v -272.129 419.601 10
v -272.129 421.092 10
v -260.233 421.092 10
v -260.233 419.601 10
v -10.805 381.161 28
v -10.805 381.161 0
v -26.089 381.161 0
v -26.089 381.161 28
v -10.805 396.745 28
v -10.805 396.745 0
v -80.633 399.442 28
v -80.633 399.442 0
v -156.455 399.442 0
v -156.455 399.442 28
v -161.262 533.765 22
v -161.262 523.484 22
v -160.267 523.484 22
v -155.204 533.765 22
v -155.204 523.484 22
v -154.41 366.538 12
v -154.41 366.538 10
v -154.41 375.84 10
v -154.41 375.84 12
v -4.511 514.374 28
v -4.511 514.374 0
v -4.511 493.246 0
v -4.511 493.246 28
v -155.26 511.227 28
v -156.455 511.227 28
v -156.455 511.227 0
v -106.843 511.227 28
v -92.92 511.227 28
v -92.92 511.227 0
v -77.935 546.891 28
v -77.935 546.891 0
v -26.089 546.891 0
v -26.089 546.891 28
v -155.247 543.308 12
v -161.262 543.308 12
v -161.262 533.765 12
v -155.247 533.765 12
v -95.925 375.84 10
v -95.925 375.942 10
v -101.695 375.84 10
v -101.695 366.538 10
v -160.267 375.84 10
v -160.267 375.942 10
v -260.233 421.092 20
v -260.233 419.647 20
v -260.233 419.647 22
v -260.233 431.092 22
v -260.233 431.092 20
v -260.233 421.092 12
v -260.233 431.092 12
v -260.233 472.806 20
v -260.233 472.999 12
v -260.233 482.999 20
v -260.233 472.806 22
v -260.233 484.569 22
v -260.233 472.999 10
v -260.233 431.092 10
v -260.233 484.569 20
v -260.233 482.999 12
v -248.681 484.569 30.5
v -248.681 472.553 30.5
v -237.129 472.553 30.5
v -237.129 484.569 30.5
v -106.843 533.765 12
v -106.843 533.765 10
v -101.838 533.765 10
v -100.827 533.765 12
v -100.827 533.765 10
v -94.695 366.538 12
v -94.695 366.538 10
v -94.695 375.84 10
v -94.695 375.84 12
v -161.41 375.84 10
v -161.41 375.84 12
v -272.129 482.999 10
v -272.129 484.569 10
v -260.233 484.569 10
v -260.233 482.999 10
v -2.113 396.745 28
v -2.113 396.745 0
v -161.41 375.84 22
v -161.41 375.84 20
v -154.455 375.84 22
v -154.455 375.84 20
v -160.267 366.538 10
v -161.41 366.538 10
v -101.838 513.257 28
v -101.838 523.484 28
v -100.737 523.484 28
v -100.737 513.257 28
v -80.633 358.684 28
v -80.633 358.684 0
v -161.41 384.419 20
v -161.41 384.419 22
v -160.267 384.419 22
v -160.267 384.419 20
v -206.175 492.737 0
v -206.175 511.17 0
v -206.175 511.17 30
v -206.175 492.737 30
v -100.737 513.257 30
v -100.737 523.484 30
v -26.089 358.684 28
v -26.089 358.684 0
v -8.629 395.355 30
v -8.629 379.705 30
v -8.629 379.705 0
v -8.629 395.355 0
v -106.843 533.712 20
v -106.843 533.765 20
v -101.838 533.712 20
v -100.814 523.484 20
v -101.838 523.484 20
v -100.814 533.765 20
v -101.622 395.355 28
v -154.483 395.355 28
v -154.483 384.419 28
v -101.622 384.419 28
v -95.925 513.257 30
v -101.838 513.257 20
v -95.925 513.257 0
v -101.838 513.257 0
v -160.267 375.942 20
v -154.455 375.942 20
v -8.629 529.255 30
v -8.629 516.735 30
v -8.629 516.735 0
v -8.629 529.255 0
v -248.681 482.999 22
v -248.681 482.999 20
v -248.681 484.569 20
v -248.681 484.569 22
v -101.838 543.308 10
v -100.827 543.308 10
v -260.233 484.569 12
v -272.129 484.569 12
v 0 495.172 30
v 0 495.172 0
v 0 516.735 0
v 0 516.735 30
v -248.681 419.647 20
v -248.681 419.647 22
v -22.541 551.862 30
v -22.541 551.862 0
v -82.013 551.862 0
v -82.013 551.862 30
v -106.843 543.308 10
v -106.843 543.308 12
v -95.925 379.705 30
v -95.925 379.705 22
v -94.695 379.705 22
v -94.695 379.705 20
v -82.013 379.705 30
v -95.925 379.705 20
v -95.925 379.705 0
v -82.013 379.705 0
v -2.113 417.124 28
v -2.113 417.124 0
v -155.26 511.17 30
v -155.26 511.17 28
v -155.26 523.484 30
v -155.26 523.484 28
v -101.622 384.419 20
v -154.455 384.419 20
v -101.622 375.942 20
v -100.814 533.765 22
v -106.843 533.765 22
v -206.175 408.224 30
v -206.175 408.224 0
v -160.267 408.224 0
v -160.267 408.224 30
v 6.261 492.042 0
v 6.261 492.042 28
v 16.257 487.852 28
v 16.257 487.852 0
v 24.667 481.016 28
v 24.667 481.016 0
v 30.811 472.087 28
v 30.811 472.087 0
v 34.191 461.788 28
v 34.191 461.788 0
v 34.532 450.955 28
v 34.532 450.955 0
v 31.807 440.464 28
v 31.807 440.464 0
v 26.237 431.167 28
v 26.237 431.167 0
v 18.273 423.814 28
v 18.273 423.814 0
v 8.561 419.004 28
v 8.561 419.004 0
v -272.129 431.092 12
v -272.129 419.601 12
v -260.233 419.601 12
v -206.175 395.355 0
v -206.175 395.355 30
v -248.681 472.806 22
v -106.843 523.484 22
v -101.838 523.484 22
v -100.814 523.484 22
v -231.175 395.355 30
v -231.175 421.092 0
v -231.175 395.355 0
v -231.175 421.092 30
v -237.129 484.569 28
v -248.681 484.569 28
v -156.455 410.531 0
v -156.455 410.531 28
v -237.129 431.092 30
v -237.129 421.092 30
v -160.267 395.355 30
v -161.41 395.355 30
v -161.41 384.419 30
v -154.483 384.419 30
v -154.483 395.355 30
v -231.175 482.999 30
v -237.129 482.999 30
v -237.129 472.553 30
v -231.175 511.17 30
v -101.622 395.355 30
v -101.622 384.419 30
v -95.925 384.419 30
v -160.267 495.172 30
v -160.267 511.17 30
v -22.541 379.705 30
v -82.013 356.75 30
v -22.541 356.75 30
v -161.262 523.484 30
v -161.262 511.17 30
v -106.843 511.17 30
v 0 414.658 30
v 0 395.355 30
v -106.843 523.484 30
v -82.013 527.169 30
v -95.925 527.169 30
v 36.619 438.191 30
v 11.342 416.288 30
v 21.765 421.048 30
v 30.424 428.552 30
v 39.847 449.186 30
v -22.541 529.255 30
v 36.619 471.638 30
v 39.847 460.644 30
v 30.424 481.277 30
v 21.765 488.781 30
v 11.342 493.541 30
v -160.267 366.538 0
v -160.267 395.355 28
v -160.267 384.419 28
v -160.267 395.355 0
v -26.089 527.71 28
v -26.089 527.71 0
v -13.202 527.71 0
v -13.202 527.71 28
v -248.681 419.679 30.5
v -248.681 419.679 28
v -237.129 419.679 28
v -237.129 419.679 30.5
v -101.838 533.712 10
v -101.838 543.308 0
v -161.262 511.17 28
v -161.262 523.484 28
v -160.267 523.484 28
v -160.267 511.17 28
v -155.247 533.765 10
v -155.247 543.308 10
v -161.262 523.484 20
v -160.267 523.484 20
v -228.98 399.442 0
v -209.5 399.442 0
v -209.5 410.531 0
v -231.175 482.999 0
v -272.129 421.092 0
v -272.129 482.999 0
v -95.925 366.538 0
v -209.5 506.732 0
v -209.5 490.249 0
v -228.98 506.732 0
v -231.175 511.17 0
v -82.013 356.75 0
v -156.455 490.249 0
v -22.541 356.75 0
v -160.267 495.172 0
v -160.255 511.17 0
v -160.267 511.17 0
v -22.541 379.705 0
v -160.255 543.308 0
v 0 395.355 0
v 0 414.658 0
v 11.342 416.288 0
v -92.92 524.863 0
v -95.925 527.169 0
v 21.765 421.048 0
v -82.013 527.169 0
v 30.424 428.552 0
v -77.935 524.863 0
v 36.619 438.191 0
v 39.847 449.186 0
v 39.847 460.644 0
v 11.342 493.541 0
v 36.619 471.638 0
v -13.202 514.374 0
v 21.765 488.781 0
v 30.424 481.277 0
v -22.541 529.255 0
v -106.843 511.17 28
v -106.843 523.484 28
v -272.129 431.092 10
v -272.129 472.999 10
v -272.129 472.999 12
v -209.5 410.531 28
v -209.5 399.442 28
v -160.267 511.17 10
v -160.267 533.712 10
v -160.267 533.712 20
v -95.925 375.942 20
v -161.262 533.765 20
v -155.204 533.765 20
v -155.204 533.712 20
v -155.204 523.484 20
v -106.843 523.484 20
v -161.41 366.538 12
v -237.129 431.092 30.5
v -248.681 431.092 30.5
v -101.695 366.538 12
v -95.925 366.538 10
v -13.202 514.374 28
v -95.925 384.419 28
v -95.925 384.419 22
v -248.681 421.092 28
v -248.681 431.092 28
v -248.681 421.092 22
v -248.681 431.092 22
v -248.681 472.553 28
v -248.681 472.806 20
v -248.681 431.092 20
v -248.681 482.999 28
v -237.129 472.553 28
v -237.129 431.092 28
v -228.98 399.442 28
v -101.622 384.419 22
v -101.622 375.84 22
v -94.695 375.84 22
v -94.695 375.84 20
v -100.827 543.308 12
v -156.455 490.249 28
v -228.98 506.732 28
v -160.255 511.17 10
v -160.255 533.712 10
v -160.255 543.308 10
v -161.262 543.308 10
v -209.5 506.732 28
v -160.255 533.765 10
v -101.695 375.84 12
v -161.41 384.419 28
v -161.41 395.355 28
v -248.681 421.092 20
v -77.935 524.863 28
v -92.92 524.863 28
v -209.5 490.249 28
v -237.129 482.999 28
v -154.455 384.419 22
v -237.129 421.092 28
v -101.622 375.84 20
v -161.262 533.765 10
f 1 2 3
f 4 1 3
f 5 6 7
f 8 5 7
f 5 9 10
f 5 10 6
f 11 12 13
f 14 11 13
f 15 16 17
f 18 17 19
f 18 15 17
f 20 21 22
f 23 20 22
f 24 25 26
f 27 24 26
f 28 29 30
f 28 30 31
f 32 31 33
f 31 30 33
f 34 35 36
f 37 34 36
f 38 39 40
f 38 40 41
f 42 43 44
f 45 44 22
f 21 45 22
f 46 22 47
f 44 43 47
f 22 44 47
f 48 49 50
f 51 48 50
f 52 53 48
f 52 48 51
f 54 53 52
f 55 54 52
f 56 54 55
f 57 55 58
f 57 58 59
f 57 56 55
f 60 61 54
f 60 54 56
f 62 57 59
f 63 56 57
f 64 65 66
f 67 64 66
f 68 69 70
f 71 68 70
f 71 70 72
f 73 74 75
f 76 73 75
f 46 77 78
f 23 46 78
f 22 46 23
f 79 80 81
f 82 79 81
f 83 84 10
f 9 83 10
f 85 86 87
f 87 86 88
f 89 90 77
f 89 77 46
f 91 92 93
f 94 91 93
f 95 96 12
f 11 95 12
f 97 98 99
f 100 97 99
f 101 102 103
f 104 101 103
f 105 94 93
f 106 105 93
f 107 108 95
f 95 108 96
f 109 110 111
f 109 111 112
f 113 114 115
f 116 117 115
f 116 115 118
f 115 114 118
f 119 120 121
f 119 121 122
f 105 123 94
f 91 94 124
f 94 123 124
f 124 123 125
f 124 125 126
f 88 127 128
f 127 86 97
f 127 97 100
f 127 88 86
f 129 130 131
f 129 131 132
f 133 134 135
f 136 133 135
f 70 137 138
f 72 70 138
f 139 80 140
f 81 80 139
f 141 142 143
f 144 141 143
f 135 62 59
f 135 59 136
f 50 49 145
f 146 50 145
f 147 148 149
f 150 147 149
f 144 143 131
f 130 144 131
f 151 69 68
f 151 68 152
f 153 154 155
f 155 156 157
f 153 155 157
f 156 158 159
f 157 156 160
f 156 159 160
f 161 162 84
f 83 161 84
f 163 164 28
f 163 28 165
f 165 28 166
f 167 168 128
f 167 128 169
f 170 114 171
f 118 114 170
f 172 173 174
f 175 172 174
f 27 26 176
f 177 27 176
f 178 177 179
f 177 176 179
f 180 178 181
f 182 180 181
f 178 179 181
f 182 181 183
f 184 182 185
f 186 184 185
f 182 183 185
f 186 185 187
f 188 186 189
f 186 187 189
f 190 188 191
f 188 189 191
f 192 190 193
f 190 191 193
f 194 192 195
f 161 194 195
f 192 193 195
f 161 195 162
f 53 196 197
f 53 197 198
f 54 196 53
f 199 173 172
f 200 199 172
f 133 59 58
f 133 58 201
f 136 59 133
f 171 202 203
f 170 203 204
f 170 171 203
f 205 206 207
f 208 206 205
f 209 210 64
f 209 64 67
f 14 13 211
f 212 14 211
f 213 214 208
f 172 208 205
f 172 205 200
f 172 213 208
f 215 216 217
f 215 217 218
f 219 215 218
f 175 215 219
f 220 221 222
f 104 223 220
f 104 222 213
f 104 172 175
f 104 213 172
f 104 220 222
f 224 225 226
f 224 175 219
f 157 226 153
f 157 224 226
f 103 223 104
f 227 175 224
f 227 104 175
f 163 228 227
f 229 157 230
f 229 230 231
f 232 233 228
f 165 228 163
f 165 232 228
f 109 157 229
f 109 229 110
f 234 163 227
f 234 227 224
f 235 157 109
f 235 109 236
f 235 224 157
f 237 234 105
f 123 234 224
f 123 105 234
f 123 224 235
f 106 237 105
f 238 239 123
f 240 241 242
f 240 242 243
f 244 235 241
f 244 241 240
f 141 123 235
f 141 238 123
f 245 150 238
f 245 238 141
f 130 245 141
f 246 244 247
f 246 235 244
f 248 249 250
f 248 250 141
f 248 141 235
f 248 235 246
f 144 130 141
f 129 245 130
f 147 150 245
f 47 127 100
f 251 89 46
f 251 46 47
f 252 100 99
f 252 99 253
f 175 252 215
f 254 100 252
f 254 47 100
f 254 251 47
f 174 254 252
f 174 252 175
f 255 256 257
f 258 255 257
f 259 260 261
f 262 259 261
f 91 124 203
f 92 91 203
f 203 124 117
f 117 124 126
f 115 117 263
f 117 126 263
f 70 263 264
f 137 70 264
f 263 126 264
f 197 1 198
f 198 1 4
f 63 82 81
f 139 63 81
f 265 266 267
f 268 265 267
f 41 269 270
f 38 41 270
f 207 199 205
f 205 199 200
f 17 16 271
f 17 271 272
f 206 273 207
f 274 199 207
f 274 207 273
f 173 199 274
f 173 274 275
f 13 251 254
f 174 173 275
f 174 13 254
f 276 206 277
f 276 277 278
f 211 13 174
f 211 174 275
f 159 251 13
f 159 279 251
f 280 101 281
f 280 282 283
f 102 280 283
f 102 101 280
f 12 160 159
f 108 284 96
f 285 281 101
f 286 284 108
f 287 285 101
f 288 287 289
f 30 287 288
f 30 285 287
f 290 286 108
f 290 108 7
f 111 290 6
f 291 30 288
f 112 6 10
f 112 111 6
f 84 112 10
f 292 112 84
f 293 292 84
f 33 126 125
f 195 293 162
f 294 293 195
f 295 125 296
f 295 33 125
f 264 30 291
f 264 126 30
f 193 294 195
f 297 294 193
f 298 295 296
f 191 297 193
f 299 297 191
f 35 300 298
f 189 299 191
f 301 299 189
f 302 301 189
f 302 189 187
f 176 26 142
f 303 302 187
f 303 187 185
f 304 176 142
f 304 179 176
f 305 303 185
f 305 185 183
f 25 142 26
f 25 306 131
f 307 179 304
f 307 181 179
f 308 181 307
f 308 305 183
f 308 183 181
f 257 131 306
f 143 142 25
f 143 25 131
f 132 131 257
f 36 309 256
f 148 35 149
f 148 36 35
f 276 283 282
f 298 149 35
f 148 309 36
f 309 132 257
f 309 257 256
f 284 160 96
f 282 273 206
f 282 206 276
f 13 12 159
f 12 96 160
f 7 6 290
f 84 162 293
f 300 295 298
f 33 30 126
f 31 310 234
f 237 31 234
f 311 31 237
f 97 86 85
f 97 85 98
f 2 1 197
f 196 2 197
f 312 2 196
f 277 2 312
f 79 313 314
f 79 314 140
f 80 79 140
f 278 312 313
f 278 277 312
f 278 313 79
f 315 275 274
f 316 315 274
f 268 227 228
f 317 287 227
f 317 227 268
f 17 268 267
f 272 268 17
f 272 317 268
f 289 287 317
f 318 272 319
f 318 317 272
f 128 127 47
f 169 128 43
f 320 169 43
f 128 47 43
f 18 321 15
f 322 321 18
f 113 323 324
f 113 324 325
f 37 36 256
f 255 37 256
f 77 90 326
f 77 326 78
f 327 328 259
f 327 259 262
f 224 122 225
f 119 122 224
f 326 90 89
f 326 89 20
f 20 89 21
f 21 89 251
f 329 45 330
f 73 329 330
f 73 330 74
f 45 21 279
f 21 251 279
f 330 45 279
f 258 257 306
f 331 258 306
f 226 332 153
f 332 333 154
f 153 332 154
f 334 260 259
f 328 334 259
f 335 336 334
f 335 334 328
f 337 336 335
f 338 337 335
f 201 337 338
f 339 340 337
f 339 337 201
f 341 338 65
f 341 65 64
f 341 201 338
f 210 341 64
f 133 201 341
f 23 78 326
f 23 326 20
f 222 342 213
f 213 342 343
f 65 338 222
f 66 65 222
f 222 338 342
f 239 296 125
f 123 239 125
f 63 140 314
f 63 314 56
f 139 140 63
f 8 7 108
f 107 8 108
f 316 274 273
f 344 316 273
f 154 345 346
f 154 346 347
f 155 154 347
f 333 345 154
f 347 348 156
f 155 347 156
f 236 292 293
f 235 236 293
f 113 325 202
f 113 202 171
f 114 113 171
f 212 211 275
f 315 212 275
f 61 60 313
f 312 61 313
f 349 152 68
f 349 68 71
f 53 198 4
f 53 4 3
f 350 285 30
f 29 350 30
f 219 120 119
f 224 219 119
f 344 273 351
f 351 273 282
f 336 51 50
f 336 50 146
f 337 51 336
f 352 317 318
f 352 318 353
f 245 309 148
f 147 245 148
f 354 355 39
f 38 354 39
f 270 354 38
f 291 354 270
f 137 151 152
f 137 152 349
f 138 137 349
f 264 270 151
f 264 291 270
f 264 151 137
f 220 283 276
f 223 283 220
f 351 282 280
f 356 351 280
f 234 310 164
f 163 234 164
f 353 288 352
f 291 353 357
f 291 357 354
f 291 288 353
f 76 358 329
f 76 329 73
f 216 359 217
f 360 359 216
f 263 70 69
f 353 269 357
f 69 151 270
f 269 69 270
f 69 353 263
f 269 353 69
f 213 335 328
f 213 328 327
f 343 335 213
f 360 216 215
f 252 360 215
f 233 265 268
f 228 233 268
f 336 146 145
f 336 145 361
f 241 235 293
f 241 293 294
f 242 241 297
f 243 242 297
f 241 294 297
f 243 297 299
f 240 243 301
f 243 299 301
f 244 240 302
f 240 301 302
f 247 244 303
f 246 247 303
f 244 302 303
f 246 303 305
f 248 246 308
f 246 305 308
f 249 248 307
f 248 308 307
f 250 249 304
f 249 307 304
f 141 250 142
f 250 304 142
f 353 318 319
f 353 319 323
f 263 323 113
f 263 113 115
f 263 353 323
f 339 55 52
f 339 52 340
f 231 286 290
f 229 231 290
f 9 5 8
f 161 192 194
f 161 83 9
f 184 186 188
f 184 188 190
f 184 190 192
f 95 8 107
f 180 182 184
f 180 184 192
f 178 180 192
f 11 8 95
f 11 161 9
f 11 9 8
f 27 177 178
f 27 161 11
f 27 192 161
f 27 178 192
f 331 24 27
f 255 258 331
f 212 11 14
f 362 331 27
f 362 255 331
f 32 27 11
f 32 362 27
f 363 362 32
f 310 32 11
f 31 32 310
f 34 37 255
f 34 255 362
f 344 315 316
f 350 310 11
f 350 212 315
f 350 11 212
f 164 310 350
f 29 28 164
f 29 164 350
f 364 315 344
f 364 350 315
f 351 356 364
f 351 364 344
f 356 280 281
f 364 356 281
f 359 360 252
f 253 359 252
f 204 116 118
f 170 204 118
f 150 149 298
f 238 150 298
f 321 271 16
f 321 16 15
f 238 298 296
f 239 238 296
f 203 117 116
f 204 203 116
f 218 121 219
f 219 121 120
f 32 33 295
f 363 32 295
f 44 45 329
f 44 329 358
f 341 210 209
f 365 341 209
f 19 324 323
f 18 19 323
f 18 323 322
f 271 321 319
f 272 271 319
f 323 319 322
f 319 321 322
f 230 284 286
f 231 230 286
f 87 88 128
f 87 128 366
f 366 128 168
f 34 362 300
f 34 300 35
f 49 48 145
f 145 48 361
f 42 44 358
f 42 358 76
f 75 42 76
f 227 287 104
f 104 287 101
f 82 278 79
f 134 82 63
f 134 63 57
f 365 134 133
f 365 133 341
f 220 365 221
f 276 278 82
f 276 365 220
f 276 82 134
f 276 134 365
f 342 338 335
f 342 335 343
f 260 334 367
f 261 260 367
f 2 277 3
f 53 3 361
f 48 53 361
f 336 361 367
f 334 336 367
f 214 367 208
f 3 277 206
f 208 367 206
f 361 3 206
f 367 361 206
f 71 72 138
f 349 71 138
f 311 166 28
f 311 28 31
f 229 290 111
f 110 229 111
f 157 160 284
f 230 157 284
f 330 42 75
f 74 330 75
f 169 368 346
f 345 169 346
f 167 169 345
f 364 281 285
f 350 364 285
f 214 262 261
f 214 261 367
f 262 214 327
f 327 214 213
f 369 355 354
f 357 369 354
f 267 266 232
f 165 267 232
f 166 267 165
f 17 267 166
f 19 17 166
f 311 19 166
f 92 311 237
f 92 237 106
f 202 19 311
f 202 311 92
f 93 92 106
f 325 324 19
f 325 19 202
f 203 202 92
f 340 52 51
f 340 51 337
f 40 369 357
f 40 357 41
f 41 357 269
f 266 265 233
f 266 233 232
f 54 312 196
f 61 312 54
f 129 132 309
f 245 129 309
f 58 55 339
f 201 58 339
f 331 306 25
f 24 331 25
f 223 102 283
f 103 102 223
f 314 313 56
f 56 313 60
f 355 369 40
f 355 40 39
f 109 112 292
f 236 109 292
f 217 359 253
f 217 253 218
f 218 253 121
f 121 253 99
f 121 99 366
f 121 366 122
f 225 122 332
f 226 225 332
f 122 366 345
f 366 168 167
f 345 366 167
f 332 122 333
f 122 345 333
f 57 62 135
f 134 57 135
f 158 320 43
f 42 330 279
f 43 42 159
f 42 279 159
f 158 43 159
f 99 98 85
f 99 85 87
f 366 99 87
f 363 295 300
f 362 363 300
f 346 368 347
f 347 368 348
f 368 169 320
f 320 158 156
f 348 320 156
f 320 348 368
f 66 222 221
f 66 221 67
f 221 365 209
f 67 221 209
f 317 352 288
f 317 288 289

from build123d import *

# Parameters (mm, degrees)
BOSS_EXTRUDE1_DEPTH  = 30
SKETCH4_W            = 35
SKETCH4_H            = 61.907073604
BOSS_EXTRUDE2_DEPTH  = 10
SKETCH5_W            = 23.104058428
SKETCH5_H            = 61.907073604
BOSS_EXTRUDE3_DEPTH  = 10
SKETCH6_W            = 11.552029214
SKETCH6_H            = 61.907073604
BOSS_EXTRUDE5_DEPTH  = 8
SKETCH8_W            = 11.895941572
SKETCH8_H            = 11.490805908
SKETCH8_H_2          = 11.569660377
BOSS_EXTRUDE6_DEPTH  = 2
SKETCH9_W            = 11.552029214
SKETCH9_H            = 11.763067294
SKETCH9_H_2          = 11.444663326
BOSS_EXTRUDE7_DEPTH  = 2
SKETCH10_W           = 11.552029214
SKETCH10_H           = 12.016051613
SKETCH10_H_2         = 11.413040286
BOSS_EXTRUDE8_DEPTH  = 2.5
SKETCH11_W           = 64.341621443
SKETCH11_H           = 28.817099519
BOSS_EXTRUDE9_DEPTH  = 10
SKETCH12_W           = 64.341621443
SKETCH12_H           = 19.413143898
BOSS_EXTRUDE10_DEPTH = 10
SKETCH13_W           = 64.341621443
SKETCH13_H           = 10.936081157
BOSS_EXTRUDE11_DEPTH = 8
SKETCH14_W           = 7
SKETCH14_H           = 9.302294552
BOSS_EXTRUDE12_DEPTH = 2
SKETCH15_W           = 6.954726323
SKETCH15_H           = 8.57872381
SKETCH15_W_2         = 6.927384131
BOSS_EXTRUDE13_DEPTH = 2
SKETCH16_W           = 6.926390046
SKETCH16_H           = 10.936081157
SKETCH16_W_2         = 6.728901939
BOSS_EXTRUDE14_DEPTH = 2
SKETCH17_W           = 58.417259869
SKETCH17_H           = 32.138328606
BOSS_EXTRUDE15_DEPTH = 10
SKETCH18_W           = 58.429148121
SKETCH18_H           = 22.541723998
BOSS_EXTRUDE16_DEPTH = 10
SKETCH19_W           = 58.429148121
SKETCH19_H           = 12.314239644
BOSS_EXTRUDE17_DEPTH = 8
SKETCH20_W           = 30
SKETCH20_H           = 115.814918598
BOSS_EXTRUDE18_DEPTH = 25
SKETCH21_W           = 6.015404917
SKETCH21_H           = 9.543718354
SKETCH21_W_2         = 6.015404916
BOSS_EXTRUDE19_DEPTH = 2
SKETCH22_W           = 6.058740194
SKETCH22_H           = 10.280370608
SKETCH22_W_2         = 6.028288377
BOSS_EXTRUDE20_DEPTH = 2
SKETCH23_W           = 6.002521456
SKETCH23_H           = 12.314239644
SKETCH23_W_2         = 6.105589141
BOSS_EXTRUDE21_DEPTH = 2
CUT_EXTRUDE2_DEPTH   = 28


with BuildPart() as part:
    # Sketch1 → Boss-Extrude1 (new body)
    with BuildSketch(Plane.XY):
        with BuildLine():
            Line((-237.128848942, 435.351344416), (-237.128848942, 421.091849934))
            Line((-237.128848942, 421.091849934), (-206.17531214, 421.091849934))
            Line((-206.17531214, 421.091849934), (-206.17531214, 408.223525645))
            Line((-206.17531214, 408.223525645), (-160.266695759, 408.223525645))
            Line((-160.266695759, 408.223525645), (-160.266695759, 395.355201356))
            Line((-160.266695759, 395.355201356), (-131.052121698, 395.355201356))
            Line((-131.052121698, 395.355201356), (-101.837547638, 395.355201356))
            Line((-101.837547638, 395.355201356), (-95.925074316, 395.355201356))
            Line((-95.925074316, 395.355201356), (-95.925074316, 379.704536681))
            Line((-95.925074316, 379.704536681), (-82.013372382, 379.704536681))
            Line((-82.013372382, 379.704536681), (-82.013372382, 356.75022849))
            Line((-82.013372382, 356.75022849), (-22.540846616, 356.75022849))
            Line((-22.540846616, 356.75022849), (-22.540846616, 379.704536681))
            Line((-22.540846616, 379.704536681), (-8.629144682, 379.704536681))
            Line((-8.629144682, 379.704536681), (-8.629144682, 395.355201356))
            Line((-8.629144682, 395.355201356), (0, 395.355201356))
            Line((0, 395.355201356), (0, 414.657687789))
            ThreePointArc((0, 414.657687789), (40.25698747, 454.91467526), (0, 495.17166273))
            Line((0, 495.17166273), (0, 516.734800727))
            Line((0, 516.734800727), (-8.629144682, 516.734800727))
            Line((-8.629144682, 516.734800727), (-8.629144682, 529.255332468))
            Line((-8.629144682, 529.255332468), (-22.540846616, 529.255332468))
            Line((-22.540846616, 529.255332468), (-22.540846616, 551.86184811))
            Line((-22.540846616, 551.86184811), (-82.013372382, 551.86184811))
            Line((-82.013372382, 551.86184811), (-82.013372382, 527.168577178))
            Line((-82.013372382, 527.168577178), (-95.925074316, 527.168577178))
            Line((-95.925074316, 527.168577178), (-95.925074316, 513.256875244))
            Line((-95.925074316, 513.256875244), (-101.837547638, 513.256875244))
            Line((-101.837547638, 513.256875244), (-101.837547638, 511.170119954))
            Line((-101.837547638, 511.170119954), (-131.052121698, 511.170119954))
            Line((-131.052121698, 511.170119954), (-160.266695759, 511.170119954))
            Line((-160.266695759, 511.170119954), (-160.266695759, 495.17166273))
            Line((-160.266695759, 495.17166273), (-206.17531214, 492.737114892))
            Line((-206.17531214, 492.737114892), (-206.17531214, 482.998923538))
            Line((-206.17531214, 482.998923538), (-237.128848942, 482.998923538))
            Line((-237.128848942, 482.998923538), (-237.128848942, 464.565918476))
            Line((-237.128848942, 464.565918476), (-237.128848942, 454.132142026))
            Line((-237.128848942, 454.132142026), (-237.128848942, 435.351344416))
        make_face()
    extrude(amount=BOSS_EXTRUDE1_DEPTH)

    # Sketch4 → Boss-Extrude2 (add)
    with BuildSketch(Plane(origin=(0, 0, 0), x_dir=(-1, 0, 0), z_dir=(0, 0, -1))):
        with Locations((254.628848942, 452.045386736)):
            Rectangle(SKETCH4_W, SKETCH4_H)
    extrude(amount=-BOSS_EXTRUDE2_DEPTH)

    # Sketch5 → Boss-Extrude3 (add)
    with BuildSketch(Plane.XY.offset(10)):
        with Locations((-248.680878156, 452.045386736)):
            Rectangle(SKETCH5_W, SKETCH5_H)
    extrude(amount=BOSS_EXTRUDE3_DEPTH)

    # Sketch6 → Boss-Extrude5 (add)
    with BuildSketch(Plane.XY.offset(20)):
        with Locations((-242.904863549, 452.045386736)):
            Rectangle(SKETCH6_W, SKETCH6_H)
    extrude(amount=BOSS_EXTRUDE5_DEPTH)

    # Sketch8 → Boss-Extrude6 (add)
    with BuildSketch(Plane.XY.offset(10)):
        with Locations((-266.180878156, 425.34644698)):
            Rectangle(SKETCH8_W, SKETCH8_H)
        with Locations((-266.180878156, 478.783753727)):
            Rectangle(SKETCH8_W, SKETCH8_H_2)
    extrude(amount=BOSS_EXTRUDE6_DEPTH)

    # Sketch9 → Boss-Extrude7 (add)
    with BuildSketch(Plane.XY.offset(20)):
        with Locations((-254.456892763, 478.687050268)):
            Rectangle(SKETCH9_W, SKETCH9_H)
        with Locations((-254.456892763, 425.369518271)):
            Rectangle(SKETCH9_W, SKETCH9_H_2)
    extrude(amount=BOSS_EXTRUDE7_DEPTH)

    # Sketch10 → Boss-Extrude8 (add)
    with BuildSketch(Plane.XY.offset(28)):
        with Locations((-242.904863549, 478.560558109)):
            Rectangle(SKETCH10_W, SKETCH10_H)
        with Locations((-242.904863549, 425.385329791)):
            Rectangle(SKETCH10_W, SKETCH10_H_2)
    extrude(amount=BOSS_EXTRUDE8_DEPTH)

    # Sketch11 → Boss-Extrude9 (add)
    with BuildSketch(Plane(origin=(0, 0, 0), x_dir=(-1, 0, 0), z_dir=(0, 0, -1))):
        with Locations((128.095885038, 380.946651597)):
            Rectangle(SKETCH11_W, SKETCH11_H)
    extrude(amount=-BOSS_EXTRUDE9_DEPTH)

    # Sketch12 → Boss-Extrude10 (add)
    with BuildSketch(Plane.XY.offset(10)):
        with Locations((-128.095885038, 385.648629407)):
            Rectangle(SKETCH12_W, SKETCH12_H)
    extrude(amount=BOSS_EXTRUDE10_DEPTH)

    # Sketch13 → Boss-Extrude11 (add)
    with BuildSketch(Plane.XY.offset(20)):
        with Locations((-128.095885038, 389.887160778)):
            Rectangle(SKETCH13_W, SKETCH13_H)
    extrude(amount=BOSS_EXTRUDE11_DEPTH)

    # Sketch14 → Boss-Extrude12 (add)
    with BuildSketch(Plane.XY.offset(10)):
        with Locations((-157.909862062, 371.189249113)):
            Rectangle(SKETCH14_W, SKETCH14_H)
        with Locations((-98.195021783, 371.189249113)):
            Rectangle(SKETCH14_W, SKETCH14_H)
    extrude(amount=BOSS_EXTRUDE12_DEPTH)

    # Sketch15 → Boss-Extrude13 (add)
    with BuildSketch(Plane.XY.offset(20)):
        with Locations((-157.932498901, 380.129758294)):
            Rectangle(SKETCH15_W, SKETCH15_H)
        with Locations((-98.158713849, 380.129758294)):
            Rectangle(SKETCH15_W_2, SKETCH15_H)
    extrude(amount=BOSS_EXTRUDE13_DEPTH)

    # Sketch16 → Boss-Extrude14 (add)
    with BuildSketch(Plane.XY.offset(28)):
        with Locations((-157.946667039, 389.887160778)):
            Rectangle(SKETCH16_W, SKETCH16_H)
        with Locations((-98.257954944, 389.887160778)):
            Rectangle(SKETCH16_W_2, SKETCH16_H)
    extrude(amount=BOSS_EXTRUDE14_DEPTH)

    # Sketch17 → Boss-Extrude15 (add)
    with BuildSketch(Plane(origin=(0, 0, 0), x_dir=(-1, 0, 0), z_dir=(0, 0, -1))):
        with Locations((131.046177572, 527.239284257)):
            Rectangle(SKETCH17_W, SKETCH17_H)
    extrude(amount=-BOSS_EXTRUDE15_DEPTH)

    # Sketch18 → Boss-Extrude16 (add)
    with BuildSketch(Plane.XY.offset(10)):
        with Locations((-131.052121699, 522.440981953)):
            Rectangle(SKETCH18_W, SKETCH18_H)
    extrude(amount=BOSS_EXTRUDE16_DEPTH)

    # Sketch19 → Boss-Extrude17 (add)
    with BuildSketch(Plane.XY.offset(20)):
        with Locations((-131.052121699, 517.327239776)):
            Rectangle(SKETCH19_W, SKETCH19_H)
    extrude(amount=BOSS_EXTRUDE17_DEPTH)

    # Sketch20 → Boss-Extrude18 (add)
    with BuildSketch(Plane.ZY.offset(206.17531214)):
        with Locations((15, 453.262660655)):
            Rectangle(SKETCH20_W, SKETCH20_H)
    extrude(amount=BOSS_EXTRUDE18_DEPTH)

    # Sketch21 → Boss-Extrude19 (add)
    with BuildSketch(Plane.XY.offset(10)):
        with Locations((-158.254585418, 538.536589383)):
            Rectangle(SKETCH21_W, SKETCH21_H)
        with Locations((-103.834847481, 538.536589383)):
            Rectangle(SKETCH21_W_2, SKETCH21_H)
    extrude(amount=BOSS_EXTRUDE19_DEPTH)

    # Sketch22 → Boss-Extrude20 (add)
    with BuildSketch(Plane.XY.offset(20)):
        with Locations((-158.232917779, 528.624544902)):
            Rectangle(SKETCH22_W, SKETCH22_H)
        with Locations((-103.828405751, 528.624544902)):
            Rectangle(SKETCH22_W_2, SKETCH22_H)
    extrude(amount=BOSS_EXTRUDE20_DEPTH)

    # Sketch23 → Boss-Extrude21 (add)
    with BuildSketch(Plane.XY.offset(28)):
        with Locations((-158.261027148, 517.327239776)):
            Rectangle(SKETCH23_W, SKETCH23_H)
        with Locations((-103.789755369, 517.327239776)):
            Rectangle(SKETCH23_W_2, SKETCH23_H)
    extrude(amount=BOSS_EXTRUDE21_DEPTH)

    # Sketch24 → Cut-Extrude2 (cut)
    with BuildSketch(Plane(origin=(0, 0, 0), x_dir=(-1, 0, 0), z_dir=(0, 0, -1))):
        with BuildLine():
            Line((228.979940095, 479.759783132), (228.979940095, 506.732020696))
            Line((228.979940095, 506.732020696), (209.499990744, 506.732020696))
            Line((209.499990744, 506.732020696), (209.499990744, 490.248986629))
            Line((209.499990744, 490.248986629), (156.454590203, 490.248986629))
            Line((156.454590203, 490.248986629), (156.454590203, 511.227393623))
            Line((156.454590203, 511.227393623), (107.005488005, 511.227393623))
            Line((107.005488005, 511.227393623), (92.919986166, 511.227393623))
            Line((92.919986166, 511.227393623), (92.919986166, 524.863358168))
            Line((92.919986166, 524.863358168), (77.935409742, 524.863358168))
            Line((77.935409742, 524.863358168), (77.935409742, 546.890685512))
            Line((77.935409742, 546.890685512), (26.088775316, 546.890685512))
            Line((26.088775316, 546.890685512), (26.088775316, 527.710427689))
            Line((26.088775316, 527.710427689), (13.202039591, 527.710427689))
            Line((13.202039591, 527.710427689), (13.202039591, 514.374154672))
            Line((13.202039591, 514.374154672), (4.510985265, 514.374154672))
            Line((4.510985265, 514.374154672), (4.510985265, 493.245901914))
            ThreePointArc((4.510985265, 493.245901914), (-34.748604966, 456.383843911), (2.113453037, 417.124253681))
            Line((2.113453037, 417.124253681), (2.113453037, 396.745229744))
            Line((2.113453037, 396.745229744), (10.804507363, 396.745229744))
            Line((10.804507363, 396.745229744), (10.804507363, 381.161270263))
            Line((10.804507363, 381.161270263), (26.088775316, 381.161270263))
            Line((26.088775316, 381.161270263), (26.088775316, 358.684405627))
            Line((26.088775316, 358.684405627), (80.632633499, 358.684405627))
            Line((80.632633499, 358.684405627), (80.632633499, 381.161270263))
            Line((80.632633499, 381.161270263), (80.632633499, 390.751399175))
            Line((80.632633499, 390.751399175), (80.632633499, 399.4424535))
            Line((80.632633499, 399.4424535), (156.454590203, 399.4424535))
            Line((156.454590203, 399.4424535), (156.454590203, 410.531040054))
            Line((156.454590203, 410.531040054), (209.499990744, 410.531040054))
            Line((209.499990744, 410.531040054), (209.499990744, 399.4424535))
            Line((209.499990744, 399.4424535), (228.979940095, 399.4424535))
            Line((228.979940095, 399.4424535), (228.979940095, 424.017158836))
            Line((228.979940095, 424.017158836), (228.979940095, 479.759783132))
        make_face()
    extrude(amount=-CUT_EXTRUDE2_DEPTH, mode=Mode.SUBTRACT)


solid = part.part
